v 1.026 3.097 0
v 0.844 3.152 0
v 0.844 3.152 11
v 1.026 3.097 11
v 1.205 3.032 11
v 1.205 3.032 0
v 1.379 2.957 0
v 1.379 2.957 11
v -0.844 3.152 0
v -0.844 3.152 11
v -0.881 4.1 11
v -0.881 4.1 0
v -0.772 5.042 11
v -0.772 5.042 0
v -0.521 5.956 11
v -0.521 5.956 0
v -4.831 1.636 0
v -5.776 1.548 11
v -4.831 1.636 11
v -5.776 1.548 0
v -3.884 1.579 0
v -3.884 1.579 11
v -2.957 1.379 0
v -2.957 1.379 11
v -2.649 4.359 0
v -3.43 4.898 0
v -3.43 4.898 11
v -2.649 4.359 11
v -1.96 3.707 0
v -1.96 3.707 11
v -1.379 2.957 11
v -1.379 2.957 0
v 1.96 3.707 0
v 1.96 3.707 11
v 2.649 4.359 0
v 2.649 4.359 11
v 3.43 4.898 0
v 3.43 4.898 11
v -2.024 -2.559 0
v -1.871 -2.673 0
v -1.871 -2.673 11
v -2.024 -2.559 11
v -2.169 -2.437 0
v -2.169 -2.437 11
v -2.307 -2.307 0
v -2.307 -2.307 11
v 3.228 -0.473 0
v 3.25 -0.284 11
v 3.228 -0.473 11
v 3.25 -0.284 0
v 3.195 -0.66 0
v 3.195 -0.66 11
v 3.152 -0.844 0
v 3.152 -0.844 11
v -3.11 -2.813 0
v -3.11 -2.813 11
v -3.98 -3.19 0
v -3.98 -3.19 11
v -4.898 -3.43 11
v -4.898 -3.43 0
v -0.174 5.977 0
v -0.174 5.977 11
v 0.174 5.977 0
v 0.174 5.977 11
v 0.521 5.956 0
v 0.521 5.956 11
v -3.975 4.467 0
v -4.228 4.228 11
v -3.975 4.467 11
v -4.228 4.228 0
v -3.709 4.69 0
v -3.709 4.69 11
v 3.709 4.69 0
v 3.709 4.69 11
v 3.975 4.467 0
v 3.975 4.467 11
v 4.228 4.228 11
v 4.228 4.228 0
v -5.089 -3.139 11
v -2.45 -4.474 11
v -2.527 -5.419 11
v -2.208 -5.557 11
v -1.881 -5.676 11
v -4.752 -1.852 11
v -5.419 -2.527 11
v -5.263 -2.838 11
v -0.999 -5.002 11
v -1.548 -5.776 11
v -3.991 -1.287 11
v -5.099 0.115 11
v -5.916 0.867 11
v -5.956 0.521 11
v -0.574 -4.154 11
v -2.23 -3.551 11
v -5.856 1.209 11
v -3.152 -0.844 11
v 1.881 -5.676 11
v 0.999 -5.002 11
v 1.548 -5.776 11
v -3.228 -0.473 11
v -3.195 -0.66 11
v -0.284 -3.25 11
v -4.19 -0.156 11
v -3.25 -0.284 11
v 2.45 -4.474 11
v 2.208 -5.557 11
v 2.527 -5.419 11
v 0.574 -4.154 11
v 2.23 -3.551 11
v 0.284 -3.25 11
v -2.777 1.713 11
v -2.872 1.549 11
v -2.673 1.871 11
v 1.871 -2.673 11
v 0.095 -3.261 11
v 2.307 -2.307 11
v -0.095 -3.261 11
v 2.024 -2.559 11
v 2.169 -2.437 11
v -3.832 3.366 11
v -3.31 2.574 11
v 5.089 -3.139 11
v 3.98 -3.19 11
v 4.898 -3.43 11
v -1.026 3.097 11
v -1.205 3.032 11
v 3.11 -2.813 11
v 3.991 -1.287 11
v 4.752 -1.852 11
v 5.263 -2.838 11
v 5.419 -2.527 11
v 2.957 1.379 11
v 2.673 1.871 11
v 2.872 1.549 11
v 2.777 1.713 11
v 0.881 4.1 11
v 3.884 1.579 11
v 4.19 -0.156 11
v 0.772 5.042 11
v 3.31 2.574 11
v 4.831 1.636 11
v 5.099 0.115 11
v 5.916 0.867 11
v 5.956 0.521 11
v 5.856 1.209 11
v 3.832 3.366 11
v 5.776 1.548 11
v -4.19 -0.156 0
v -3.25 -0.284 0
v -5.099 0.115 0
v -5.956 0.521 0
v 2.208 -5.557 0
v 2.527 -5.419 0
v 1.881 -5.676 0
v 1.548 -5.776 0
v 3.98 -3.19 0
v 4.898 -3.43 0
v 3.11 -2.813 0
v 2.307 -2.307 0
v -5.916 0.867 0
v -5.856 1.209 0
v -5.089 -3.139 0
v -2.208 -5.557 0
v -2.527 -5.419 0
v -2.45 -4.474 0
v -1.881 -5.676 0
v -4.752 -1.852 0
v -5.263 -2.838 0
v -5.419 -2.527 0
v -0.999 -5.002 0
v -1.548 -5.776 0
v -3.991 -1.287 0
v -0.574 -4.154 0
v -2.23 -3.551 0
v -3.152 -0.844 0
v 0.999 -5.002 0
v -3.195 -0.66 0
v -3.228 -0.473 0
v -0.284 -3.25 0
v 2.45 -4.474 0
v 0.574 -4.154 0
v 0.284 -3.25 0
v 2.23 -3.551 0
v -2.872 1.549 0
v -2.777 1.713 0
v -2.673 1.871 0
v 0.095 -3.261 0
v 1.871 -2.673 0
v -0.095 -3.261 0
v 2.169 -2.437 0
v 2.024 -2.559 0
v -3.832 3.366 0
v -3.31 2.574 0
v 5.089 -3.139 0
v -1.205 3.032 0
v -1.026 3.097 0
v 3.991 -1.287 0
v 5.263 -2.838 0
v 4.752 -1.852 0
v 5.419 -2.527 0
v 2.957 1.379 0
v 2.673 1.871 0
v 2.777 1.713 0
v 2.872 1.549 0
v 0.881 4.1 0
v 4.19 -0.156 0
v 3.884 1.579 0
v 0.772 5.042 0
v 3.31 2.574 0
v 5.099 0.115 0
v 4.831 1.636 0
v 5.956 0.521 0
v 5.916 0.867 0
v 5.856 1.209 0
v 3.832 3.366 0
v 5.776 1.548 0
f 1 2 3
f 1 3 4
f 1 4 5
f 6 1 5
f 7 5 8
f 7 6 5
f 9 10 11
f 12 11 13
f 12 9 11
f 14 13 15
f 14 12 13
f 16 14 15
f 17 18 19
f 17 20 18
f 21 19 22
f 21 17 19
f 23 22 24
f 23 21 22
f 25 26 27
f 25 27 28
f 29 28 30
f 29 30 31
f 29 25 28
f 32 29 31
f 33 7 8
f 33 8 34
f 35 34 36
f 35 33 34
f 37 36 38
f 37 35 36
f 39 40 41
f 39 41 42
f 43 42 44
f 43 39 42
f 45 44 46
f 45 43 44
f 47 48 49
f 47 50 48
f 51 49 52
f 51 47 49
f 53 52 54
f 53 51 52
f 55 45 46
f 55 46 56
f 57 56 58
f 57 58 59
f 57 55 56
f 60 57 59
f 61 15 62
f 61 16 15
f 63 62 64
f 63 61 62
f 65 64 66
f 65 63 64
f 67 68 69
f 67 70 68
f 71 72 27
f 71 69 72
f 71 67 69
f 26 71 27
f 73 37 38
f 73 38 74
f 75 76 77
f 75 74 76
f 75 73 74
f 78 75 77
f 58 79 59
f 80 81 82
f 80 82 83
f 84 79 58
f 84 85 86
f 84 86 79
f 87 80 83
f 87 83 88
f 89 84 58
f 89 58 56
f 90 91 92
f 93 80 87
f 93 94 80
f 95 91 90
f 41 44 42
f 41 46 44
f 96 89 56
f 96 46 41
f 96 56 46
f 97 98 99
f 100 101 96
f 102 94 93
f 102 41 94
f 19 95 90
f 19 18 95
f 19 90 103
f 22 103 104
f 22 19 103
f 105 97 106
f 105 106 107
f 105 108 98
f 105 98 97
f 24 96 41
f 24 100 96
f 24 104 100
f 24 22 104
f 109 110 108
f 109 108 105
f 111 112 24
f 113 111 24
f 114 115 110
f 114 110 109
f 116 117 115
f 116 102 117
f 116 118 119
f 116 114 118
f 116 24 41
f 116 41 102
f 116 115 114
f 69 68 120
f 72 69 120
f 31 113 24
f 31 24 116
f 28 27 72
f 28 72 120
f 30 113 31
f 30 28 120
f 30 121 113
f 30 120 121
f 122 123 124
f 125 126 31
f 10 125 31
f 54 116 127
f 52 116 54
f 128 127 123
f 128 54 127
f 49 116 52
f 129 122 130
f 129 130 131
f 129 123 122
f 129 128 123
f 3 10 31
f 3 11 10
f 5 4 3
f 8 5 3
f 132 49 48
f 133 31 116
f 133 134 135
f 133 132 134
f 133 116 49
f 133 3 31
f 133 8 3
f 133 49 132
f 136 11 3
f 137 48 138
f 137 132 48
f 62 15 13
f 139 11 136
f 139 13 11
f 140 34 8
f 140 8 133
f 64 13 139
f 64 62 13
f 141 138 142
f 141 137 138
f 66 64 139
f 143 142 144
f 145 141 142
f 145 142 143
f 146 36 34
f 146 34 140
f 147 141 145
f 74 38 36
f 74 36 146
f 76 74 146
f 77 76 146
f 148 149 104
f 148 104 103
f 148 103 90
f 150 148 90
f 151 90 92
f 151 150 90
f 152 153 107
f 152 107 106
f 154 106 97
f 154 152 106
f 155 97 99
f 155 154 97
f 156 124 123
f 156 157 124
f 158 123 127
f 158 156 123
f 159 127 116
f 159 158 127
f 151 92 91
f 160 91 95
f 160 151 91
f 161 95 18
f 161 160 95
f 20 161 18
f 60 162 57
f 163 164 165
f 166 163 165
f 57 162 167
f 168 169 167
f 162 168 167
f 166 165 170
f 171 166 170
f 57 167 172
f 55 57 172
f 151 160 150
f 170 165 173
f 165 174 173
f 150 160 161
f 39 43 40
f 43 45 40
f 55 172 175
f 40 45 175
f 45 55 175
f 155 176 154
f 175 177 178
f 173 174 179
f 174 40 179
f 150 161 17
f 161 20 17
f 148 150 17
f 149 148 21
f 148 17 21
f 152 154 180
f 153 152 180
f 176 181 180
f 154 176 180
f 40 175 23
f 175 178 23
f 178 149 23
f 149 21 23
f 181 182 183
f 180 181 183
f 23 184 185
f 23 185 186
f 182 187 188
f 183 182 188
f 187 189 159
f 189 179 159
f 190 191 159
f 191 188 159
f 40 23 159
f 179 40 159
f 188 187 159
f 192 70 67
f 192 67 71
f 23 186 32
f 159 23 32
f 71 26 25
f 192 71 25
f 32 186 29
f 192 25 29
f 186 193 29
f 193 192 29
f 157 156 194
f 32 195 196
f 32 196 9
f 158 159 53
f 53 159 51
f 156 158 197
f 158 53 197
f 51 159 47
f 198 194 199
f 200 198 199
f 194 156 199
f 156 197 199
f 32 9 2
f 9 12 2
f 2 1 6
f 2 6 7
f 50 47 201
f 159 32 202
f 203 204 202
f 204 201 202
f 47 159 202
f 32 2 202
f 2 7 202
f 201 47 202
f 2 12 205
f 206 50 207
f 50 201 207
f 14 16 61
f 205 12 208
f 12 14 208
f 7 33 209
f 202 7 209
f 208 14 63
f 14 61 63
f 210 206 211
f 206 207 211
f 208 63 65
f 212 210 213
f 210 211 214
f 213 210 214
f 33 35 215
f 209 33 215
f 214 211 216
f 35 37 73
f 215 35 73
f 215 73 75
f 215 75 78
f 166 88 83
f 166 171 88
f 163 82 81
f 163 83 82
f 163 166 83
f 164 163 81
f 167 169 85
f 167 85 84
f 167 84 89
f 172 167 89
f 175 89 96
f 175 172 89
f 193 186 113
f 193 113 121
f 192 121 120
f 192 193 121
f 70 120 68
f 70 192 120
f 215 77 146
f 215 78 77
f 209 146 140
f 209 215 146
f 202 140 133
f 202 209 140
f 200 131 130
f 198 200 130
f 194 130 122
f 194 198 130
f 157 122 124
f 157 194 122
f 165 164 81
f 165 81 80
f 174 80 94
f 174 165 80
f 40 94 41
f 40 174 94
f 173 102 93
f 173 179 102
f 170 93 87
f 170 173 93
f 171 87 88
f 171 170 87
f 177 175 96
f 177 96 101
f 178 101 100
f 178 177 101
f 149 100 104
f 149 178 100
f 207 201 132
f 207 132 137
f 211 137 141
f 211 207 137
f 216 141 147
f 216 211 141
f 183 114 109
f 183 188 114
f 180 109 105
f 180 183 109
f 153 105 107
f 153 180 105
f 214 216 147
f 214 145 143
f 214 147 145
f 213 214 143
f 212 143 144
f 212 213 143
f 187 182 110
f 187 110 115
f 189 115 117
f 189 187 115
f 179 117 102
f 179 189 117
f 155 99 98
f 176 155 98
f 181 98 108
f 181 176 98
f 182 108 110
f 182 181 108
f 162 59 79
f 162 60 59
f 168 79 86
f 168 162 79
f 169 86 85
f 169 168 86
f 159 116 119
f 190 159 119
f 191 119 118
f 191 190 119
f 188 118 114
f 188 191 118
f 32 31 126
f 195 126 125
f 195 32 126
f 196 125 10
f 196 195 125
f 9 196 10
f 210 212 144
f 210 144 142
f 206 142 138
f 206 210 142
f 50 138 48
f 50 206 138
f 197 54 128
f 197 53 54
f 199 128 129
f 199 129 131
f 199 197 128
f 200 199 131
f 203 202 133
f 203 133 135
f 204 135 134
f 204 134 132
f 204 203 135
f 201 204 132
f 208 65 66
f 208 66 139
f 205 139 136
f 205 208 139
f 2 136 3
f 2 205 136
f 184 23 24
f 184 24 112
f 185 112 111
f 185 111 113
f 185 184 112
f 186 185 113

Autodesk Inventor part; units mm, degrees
sketch "Sketch1" plane through (0, 0, 0) normal (0, 0, 1) x (1, 0, 0)
  circle A0 centre (0, 0) radius 5.9792
  dimension "d0" = 11.9585
extrude "Extrusion1" add sketch "Sketch1" along normal blind 11
ref_plane "Work Plane2" through (0, 0, 5.5) normal (0, 0, 1) x (1, 0, 0)
sketch "Sketch2" plane through (0, 0, 0) normal (0, 0, -1) x (-1, 0, 0)
  circle A0 centre (0, 0) radius 5.9792 projected
  circle A1 centre (0, 0) radius 5.15
  dimension "d3" = 10.3
surface extrude "Pitch Diameter" sketch "Sketch2" against normal through all shown no curves A1
ref_plane "Work Plane8" through (0, 0, 0) normal (0.9396926, 0.3420201, 0) x (0, 0, 1)
ref_plane "Work Plane9" through (0, 0, 0) normal (1, 0, 0) x (0, 1, 0)
spur gear teeth "Spur Gear" teeth 9 pitch diameter 11.25 tip diameter 11.9585 root diameter 6.5257 face width 11 start plane through (0, 0, 0) normal (0, 0, -1) x (-1, 0, 0)
equation "\"d0\" = da_da"
equation "\"d1\" = da_b"
equation "\"d3\" = da_dw"
equation "\"d16\" = da_aw"
equation "\"d43\" = da_aw"
equation "\"d46\" = da_aw"
equation "\"da_da\" = 11.958458"
equation "\"da_b\" = 11"
equation "\"da_dw\" = 10.3"
equation "\"da_aw\" = 10.3"
properties part number "Spur Gear2" material "Steel"
